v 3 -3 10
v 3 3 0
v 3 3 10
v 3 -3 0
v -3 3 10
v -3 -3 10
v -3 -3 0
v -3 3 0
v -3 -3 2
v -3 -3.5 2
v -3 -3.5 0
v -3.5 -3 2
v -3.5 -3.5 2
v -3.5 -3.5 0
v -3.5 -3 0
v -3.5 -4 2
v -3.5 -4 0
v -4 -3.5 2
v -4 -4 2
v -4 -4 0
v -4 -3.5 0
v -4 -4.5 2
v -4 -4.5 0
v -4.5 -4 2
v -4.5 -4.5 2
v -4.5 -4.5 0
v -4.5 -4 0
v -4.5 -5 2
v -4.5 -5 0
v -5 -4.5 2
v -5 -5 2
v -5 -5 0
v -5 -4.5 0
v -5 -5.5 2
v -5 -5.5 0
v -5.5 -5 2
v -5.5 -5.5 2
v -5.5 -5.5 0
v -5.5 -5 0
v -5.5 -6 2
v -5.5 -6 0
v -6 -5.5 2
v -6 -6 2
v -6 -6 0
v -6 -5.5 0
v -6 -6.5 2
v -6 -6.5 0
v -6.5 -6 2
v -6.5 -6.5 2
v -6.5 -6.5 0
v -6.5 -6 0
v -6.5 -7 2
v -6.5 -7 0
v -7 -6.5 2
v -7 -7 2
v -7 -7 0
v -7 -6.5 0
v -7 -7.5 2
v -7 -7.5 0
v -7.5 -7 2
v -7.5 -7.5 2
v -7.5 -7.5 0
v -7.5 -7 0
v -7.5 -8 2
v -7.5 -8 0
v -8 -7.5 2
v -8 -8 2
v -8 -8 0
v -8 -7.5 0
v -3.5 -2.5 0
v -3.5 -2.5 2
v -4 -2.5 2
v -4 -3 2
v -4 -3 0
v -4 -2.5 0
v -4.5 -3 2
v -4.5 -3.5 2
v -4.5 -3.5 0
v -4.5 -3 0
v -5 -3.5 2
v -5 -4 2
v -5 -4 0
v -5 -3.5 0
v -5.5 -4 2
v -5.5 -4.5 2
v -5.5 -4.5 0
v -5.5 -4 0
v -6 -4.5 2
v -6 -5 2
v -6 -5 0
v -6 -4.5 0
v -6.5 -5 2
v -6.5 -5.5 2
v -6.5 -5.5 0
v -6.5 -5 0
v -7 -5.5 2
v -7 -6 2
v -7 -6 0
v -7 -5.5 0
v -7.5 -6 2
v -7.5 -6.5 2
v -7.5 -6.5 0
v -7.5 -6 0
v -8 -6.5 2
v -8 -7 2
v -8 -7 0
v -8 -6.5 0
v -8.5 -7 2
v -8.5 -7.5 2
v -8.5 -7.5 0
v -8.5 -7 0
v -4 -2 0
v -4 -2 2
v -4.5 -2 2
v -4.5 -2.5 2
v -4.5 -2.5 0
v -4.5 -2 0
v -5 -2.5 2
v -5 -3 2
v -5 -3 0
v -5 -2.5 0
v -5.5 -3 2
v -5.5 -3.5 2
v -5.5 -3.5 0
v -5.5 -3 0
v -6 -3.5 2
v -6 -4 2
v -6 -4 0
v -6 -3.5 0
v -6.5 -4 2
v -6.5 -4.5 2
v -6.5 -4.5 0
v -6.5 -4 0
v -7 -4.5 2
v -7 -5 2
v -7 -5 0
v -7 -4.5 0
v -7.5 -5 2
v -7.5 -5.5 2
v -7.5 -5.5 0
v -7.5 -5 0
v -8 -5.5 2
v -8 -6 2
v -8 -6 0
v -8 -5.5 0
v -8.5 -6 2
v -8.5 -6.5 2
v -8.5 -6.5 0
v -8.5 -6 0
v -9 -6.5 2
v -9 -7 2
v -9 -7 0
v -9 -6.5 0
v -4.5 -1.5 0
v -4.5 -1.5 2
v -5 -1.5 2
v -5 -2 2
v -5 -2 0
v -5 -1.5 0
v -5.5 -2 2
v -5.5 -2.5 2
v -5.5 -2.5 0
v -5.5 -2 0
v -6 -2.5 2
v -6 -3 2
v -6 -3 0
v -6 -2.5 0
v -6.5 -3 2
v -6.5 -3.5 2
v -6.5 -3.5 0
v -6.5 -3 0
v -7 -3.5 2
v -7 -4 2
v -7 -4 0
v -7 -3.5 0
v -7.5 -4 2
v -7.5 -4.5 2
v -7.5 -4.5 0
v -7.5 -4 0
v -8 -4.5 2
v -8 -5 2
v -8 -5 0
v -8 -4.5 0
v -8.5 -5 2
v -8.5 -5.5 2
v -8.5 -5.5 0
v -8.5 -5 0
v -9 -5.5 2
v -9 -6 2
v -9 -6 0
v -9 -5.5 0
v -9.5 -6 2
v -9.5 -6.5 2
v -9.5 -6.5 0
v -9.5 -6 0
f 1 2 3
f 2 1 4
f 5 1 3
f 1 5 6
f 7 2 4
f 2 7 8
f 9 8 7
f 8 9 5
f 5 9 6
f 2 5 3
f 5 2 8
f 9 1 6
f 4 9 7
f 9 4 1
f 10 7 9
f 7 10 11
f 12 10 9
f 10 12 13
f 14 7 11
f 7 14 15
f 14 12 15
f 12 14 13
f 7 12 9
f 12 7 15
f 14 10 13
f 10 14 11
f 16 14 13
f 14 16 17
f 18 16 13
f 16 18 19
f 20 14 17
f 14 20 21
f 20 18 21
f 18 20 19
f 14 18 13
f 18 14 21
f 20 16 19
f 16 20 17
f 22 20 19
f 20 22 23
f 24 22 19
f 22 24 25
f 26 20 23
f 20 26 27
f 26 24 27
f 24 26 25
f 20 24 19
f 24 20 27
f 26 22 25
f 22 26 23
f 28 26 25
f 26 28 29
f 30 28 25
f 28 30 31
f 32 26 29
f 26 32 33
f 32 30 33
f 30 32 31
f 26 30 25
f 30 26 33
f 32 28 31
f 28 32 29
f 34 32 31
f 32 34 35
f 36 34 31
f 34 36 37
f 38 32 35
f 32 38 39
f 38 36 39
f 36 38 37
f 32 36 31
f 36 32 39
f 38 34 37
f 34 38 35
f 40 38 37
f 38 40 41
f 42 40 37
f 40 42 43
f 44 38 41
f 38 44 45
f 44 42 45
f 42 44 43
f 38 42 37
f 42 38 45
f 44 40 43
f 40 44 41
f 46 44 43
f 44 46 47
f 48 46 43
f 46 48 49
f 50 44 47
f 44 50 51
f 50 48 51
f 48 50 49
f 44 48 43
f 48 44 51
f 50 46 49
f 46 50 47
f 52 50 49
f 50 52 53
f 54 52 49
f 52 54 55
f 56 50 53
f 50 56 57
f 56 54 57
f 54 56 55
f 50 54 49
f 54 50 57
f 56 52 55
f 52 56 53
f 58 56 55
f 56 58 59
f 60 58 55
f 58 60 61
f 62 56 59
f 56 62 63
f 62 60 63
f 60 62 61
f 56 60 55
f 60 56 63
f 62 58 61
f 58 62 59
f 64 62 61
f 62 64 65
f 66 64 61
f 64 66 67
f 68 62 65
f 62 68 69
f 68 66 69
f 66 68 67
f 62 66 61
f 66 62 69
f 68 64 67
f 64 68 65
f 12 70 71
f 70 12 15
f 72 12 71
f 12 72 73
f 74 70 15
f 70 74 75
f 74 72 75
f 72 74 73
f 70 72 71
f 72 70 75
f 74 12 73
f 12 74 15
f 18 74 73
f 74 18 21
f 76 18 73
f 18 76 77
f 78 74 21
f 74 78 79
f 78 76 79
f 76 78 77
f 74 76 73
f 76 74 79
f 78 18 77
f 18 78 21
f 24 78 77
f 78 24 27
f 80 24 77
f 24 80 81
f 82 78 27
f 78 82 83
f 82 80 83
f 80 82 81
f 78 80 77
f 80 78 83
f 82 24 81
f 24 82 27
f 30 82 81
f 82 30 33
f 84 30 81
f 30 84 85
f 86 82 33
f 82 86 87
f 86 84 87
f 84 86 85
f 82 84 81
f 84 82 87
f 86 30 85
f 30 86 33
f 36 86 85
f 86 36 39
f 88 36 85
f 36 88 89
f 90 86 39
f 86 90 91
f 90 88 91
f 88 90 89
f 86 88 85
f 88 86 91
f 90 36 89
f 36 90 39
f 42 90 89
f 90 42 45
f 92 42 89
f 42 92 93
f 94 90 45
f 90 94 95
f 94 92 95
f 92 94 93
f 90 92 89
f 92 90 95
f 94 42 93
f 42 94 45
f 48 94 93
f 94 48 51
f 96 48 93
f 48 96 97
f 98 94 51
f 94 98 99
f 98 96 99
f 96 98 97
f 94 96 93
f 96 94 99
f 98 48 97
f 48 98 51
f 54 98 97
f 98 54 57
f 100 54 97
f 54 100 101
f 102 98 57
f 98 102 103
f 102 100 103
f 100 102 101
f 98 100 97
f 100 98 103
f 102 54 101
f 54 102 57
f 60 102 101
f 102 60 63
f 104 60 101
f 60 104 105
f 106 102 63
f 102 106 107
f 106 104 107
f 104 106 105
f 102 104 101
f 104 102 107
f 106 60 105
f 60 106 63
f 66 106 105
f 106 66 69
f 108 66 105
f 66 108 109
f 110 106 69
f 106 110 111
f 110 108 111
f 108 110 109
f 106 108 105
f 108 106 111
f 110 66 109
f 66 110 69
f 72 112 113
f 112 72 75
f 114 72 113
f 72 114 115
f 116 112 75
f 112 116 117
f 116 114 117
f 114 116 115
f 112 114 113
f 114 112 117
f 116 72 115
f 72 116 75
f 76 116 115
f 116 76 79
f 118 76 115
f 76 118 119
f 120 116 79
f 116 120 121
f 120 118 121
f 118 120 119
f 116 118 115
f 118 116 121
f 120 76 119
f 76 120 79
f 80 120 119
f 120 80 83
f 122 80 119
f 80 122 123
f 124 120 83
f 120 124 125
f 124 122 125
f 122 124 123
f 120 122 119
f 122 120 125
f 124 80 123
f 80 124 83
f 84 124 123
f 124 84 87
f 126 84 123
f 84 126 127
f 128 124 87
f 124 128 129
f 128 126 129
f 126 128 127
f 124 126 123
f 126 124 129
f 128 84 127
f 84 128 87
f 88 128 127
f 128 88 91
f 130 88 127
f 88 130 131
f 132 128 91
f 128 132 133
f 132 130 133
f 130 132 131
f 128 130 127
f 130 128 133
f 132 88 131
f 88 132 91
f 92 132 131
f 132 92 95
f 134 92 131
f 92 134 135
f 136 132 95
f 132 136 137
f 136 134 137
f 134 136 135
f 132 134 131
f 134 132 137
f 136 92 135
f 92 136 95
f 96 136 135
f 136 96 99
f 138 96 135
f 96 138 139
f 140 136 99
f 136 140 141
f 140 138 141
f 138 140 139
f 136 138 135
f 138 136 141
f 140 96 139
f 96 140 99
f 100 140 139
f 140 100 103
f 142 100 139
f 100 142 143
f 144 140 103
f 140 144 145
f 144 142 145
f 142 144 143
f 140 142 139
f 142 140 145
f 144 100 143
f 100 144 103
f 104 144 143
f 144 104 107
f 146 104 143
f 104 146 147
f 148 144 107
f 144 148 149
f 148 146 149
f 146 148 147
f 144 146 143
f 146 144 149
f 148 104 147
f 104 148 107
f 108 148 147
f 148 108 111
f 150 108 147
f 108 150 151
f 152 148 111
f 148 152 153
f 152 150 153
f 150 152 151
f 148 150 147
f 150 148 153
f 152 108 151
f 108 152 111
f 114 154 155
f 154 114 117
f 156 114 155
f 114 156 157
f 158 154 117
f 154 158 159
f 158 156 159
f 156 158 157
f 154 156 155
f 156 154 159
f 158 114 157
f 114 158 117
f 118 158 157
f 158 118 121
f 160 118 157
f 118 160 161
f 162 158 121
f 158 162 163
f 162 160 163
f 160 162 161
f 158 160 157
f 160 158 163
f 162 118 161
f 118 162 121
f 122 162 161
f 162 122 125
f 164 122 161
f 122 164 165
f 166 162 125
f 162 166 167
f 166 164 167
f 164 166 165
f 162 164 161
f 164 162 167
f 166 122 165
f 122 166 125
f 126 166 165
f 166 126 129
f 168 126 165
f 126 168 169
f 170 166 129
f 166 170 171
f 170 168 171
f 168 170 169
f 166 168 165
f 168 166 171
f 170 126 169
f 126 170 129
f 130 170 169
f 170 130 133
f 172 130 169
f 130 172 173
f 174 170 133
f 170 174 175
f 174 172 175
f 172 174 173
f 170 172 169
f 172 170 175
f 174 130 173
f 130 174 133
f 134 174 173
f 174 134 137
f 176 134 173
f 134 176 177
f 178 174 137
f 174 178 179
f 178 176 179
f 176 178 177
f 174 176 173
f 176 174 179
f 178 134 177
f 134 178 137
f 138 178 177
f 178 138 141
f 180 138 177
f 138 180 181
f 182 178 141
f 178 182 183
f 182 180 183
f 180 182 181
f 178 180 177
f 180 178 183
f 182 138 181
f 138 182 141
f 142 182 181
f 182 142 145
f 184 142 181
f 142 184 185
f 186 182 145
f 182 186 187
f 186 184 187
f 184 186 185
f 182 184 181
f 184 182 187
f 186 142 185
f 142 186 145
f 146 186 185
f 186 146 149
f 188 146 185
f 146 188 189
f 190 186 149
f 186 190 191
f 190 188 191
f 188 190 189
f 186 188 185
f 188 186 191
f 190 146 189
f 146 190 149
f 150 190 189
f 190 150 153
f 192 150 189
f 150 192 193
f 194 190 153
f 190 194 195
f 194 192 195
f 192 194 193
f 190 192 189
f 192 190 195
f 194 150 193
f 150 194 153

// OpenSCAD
translate([0, 0, 5]) color([0,1,0,0.9]) cube([6, 6, 10], center=true);
translate([-3.25, -3.25, 1]) color([1,0,0]) cube([0.5, 0.5, 2], center=true);
translate([-3.75, -3.75, 1]) color([1,0,0]) cube([0.5, 0.5, 2], center=true);
translate([-4.25, -4.25, 1]) color([1,0,0]) cube([0.5, 0.5, 2], center=true);
translate([-4.75, -4.75, 1]) color([1,0,0]) cube([0.5, 0.5, 2], center=true);
translate([-5.25, -5.25, 1]) color([1,0,0]) cube([0.5, 0.5, 2], center=true);
translate([-5.75, -5.75, 1]) color([1,0,0]) cube([0.5, 0.5, 2], center=true);
translate([-6.25, -6.25, 1]) color([1,0,0]) cube([0.5, 0.5, 2], center=true);
translate([-6.75, -6.75, 1]) color([1,0,0]) cube([0.5, 0.5, 2], center=true);
translate([-7.25, -7.25, 1]) color([1,0,0]) cube([0.5, 0.5, 2], center=true);
translate([-7.75, -7.75, 1]) color([1,0,0]) cube([0.5, 0.5, 2], center=true);
translate([-3.75, -2.75, 1]) color([1,0,0]) cube([0.5, 0.5, 2], center=true);
translate([-4.25, -3.25, 1]) color([1,0,0]) cube([0.5, 0.5, 2], center=true);
translate([-4.75, -3.75, 1]) color([1,0,0]) cube([0.5, 0.5, 2], center=true);
translate([-5.25, -4.25, 1]) color([1,0,0]) cube([0.5, 0.5, 2], center=true);
translate([-5.75, -4.75, 1]) color([1,0,0]) cube([0.5, 0.5, 2], center=true);
translate([-6.25, -5.25, 1]) color([1,0,0]) cube([0.5, 0.5, 2], center=true);
translate([-6.75, -5.75, 1]) color([1,0,0]) cube([0.5, 0.5, 2], center=true);
translate([-7.25, -6.25, 1]) color([1,0,0]) cube([0.5, 0.5, 2], center=true);
translate([-7.75, -6.75, 1]) color([1,0,0]) cube([0.5, 0.5, 2], center=true);
translate([-8.25, -7.25, 1]) color([1,0,0]) cube([0.5, 0.5, 2], center=true);
translate([-4.25, -2.25, 1]) color([1,0,0]) cube([0.5, 0.5, 2], center=true);
translate([-4.75, -2.75, 1]) color([1,0,0]) cube([0.5, 0.5, 2], center=true);
translate([-5.25, -3.25, 1]) color([1,0,0]) cube([0.5, 0.5, 2], center=true);
translate([-5.75, -3.75, 1]) color([1,0,0]) cube([0.5, 0.5, 2], center=true);
translate([-6.25, -4.25, 1]) color([1,0,0]) cube([0.5, 0.5, 2], center=true);
translate([-6.75, -4.75, 1]) color([1,0,0]) cube([0.5, 0.5, 2], center=true);
translate([-7.25, -5.25, 1]) color([1,0,0]) cube([0.5, 0.5, 2], center=true);
translate([-7.75, -5.75, 1]) color([1,0,0]) cube([0.5, 0.5, 2], center=true);
translate([-8.25, -6.25, 1]) color([1,0,0]) cube([0.5, 0.5, 2], center=true);
translate([-8.75, -6.75, 1]) color([1,0,0]) cube([0.5, 0.5, 2], center=true);
translate([-4.75, -1.75, 1]) color([1,0,0]) cube([0.5, 0.5, 2], center=true);
translate([-5.25, -2.25, 1]) color([1,0,0]) cube([0.5, 0.5, 2], center=true);
translate([-5.75, -2.75, 1]) color([1,0,0]) cube([0.5, 0.5, 2], center=true);
translate([-6.25, -3.25, 1]) color([1,0,0]) cube([0.5, 0.5, 2], center=true);
translate([-6.75, -3.75, 1]) color([1,0,0]) cube([0.5, 0.5, 2], center=true);
translate([-7.25, -4.25, 1]) color([1,0,0]) cube([0.5, 0.5, 2], center=true);
translate([-7.75, -4.75, 1]) color([1,0,0]) cube([0.5, 0.5, 2], center=true);
translate([-8.25, -5.25, 1]) color([1,0,0]) cube([0.5, 0.5, 2], center=true);
translate([-8.75, -5.75, 1]) color([1,0,0]) cube([0.5, 0.5, 2], center=true);
translate([-9.25, -6.25, 1]) color([1,0,0]) cube([0.5, 0.5, 2], center=true);
